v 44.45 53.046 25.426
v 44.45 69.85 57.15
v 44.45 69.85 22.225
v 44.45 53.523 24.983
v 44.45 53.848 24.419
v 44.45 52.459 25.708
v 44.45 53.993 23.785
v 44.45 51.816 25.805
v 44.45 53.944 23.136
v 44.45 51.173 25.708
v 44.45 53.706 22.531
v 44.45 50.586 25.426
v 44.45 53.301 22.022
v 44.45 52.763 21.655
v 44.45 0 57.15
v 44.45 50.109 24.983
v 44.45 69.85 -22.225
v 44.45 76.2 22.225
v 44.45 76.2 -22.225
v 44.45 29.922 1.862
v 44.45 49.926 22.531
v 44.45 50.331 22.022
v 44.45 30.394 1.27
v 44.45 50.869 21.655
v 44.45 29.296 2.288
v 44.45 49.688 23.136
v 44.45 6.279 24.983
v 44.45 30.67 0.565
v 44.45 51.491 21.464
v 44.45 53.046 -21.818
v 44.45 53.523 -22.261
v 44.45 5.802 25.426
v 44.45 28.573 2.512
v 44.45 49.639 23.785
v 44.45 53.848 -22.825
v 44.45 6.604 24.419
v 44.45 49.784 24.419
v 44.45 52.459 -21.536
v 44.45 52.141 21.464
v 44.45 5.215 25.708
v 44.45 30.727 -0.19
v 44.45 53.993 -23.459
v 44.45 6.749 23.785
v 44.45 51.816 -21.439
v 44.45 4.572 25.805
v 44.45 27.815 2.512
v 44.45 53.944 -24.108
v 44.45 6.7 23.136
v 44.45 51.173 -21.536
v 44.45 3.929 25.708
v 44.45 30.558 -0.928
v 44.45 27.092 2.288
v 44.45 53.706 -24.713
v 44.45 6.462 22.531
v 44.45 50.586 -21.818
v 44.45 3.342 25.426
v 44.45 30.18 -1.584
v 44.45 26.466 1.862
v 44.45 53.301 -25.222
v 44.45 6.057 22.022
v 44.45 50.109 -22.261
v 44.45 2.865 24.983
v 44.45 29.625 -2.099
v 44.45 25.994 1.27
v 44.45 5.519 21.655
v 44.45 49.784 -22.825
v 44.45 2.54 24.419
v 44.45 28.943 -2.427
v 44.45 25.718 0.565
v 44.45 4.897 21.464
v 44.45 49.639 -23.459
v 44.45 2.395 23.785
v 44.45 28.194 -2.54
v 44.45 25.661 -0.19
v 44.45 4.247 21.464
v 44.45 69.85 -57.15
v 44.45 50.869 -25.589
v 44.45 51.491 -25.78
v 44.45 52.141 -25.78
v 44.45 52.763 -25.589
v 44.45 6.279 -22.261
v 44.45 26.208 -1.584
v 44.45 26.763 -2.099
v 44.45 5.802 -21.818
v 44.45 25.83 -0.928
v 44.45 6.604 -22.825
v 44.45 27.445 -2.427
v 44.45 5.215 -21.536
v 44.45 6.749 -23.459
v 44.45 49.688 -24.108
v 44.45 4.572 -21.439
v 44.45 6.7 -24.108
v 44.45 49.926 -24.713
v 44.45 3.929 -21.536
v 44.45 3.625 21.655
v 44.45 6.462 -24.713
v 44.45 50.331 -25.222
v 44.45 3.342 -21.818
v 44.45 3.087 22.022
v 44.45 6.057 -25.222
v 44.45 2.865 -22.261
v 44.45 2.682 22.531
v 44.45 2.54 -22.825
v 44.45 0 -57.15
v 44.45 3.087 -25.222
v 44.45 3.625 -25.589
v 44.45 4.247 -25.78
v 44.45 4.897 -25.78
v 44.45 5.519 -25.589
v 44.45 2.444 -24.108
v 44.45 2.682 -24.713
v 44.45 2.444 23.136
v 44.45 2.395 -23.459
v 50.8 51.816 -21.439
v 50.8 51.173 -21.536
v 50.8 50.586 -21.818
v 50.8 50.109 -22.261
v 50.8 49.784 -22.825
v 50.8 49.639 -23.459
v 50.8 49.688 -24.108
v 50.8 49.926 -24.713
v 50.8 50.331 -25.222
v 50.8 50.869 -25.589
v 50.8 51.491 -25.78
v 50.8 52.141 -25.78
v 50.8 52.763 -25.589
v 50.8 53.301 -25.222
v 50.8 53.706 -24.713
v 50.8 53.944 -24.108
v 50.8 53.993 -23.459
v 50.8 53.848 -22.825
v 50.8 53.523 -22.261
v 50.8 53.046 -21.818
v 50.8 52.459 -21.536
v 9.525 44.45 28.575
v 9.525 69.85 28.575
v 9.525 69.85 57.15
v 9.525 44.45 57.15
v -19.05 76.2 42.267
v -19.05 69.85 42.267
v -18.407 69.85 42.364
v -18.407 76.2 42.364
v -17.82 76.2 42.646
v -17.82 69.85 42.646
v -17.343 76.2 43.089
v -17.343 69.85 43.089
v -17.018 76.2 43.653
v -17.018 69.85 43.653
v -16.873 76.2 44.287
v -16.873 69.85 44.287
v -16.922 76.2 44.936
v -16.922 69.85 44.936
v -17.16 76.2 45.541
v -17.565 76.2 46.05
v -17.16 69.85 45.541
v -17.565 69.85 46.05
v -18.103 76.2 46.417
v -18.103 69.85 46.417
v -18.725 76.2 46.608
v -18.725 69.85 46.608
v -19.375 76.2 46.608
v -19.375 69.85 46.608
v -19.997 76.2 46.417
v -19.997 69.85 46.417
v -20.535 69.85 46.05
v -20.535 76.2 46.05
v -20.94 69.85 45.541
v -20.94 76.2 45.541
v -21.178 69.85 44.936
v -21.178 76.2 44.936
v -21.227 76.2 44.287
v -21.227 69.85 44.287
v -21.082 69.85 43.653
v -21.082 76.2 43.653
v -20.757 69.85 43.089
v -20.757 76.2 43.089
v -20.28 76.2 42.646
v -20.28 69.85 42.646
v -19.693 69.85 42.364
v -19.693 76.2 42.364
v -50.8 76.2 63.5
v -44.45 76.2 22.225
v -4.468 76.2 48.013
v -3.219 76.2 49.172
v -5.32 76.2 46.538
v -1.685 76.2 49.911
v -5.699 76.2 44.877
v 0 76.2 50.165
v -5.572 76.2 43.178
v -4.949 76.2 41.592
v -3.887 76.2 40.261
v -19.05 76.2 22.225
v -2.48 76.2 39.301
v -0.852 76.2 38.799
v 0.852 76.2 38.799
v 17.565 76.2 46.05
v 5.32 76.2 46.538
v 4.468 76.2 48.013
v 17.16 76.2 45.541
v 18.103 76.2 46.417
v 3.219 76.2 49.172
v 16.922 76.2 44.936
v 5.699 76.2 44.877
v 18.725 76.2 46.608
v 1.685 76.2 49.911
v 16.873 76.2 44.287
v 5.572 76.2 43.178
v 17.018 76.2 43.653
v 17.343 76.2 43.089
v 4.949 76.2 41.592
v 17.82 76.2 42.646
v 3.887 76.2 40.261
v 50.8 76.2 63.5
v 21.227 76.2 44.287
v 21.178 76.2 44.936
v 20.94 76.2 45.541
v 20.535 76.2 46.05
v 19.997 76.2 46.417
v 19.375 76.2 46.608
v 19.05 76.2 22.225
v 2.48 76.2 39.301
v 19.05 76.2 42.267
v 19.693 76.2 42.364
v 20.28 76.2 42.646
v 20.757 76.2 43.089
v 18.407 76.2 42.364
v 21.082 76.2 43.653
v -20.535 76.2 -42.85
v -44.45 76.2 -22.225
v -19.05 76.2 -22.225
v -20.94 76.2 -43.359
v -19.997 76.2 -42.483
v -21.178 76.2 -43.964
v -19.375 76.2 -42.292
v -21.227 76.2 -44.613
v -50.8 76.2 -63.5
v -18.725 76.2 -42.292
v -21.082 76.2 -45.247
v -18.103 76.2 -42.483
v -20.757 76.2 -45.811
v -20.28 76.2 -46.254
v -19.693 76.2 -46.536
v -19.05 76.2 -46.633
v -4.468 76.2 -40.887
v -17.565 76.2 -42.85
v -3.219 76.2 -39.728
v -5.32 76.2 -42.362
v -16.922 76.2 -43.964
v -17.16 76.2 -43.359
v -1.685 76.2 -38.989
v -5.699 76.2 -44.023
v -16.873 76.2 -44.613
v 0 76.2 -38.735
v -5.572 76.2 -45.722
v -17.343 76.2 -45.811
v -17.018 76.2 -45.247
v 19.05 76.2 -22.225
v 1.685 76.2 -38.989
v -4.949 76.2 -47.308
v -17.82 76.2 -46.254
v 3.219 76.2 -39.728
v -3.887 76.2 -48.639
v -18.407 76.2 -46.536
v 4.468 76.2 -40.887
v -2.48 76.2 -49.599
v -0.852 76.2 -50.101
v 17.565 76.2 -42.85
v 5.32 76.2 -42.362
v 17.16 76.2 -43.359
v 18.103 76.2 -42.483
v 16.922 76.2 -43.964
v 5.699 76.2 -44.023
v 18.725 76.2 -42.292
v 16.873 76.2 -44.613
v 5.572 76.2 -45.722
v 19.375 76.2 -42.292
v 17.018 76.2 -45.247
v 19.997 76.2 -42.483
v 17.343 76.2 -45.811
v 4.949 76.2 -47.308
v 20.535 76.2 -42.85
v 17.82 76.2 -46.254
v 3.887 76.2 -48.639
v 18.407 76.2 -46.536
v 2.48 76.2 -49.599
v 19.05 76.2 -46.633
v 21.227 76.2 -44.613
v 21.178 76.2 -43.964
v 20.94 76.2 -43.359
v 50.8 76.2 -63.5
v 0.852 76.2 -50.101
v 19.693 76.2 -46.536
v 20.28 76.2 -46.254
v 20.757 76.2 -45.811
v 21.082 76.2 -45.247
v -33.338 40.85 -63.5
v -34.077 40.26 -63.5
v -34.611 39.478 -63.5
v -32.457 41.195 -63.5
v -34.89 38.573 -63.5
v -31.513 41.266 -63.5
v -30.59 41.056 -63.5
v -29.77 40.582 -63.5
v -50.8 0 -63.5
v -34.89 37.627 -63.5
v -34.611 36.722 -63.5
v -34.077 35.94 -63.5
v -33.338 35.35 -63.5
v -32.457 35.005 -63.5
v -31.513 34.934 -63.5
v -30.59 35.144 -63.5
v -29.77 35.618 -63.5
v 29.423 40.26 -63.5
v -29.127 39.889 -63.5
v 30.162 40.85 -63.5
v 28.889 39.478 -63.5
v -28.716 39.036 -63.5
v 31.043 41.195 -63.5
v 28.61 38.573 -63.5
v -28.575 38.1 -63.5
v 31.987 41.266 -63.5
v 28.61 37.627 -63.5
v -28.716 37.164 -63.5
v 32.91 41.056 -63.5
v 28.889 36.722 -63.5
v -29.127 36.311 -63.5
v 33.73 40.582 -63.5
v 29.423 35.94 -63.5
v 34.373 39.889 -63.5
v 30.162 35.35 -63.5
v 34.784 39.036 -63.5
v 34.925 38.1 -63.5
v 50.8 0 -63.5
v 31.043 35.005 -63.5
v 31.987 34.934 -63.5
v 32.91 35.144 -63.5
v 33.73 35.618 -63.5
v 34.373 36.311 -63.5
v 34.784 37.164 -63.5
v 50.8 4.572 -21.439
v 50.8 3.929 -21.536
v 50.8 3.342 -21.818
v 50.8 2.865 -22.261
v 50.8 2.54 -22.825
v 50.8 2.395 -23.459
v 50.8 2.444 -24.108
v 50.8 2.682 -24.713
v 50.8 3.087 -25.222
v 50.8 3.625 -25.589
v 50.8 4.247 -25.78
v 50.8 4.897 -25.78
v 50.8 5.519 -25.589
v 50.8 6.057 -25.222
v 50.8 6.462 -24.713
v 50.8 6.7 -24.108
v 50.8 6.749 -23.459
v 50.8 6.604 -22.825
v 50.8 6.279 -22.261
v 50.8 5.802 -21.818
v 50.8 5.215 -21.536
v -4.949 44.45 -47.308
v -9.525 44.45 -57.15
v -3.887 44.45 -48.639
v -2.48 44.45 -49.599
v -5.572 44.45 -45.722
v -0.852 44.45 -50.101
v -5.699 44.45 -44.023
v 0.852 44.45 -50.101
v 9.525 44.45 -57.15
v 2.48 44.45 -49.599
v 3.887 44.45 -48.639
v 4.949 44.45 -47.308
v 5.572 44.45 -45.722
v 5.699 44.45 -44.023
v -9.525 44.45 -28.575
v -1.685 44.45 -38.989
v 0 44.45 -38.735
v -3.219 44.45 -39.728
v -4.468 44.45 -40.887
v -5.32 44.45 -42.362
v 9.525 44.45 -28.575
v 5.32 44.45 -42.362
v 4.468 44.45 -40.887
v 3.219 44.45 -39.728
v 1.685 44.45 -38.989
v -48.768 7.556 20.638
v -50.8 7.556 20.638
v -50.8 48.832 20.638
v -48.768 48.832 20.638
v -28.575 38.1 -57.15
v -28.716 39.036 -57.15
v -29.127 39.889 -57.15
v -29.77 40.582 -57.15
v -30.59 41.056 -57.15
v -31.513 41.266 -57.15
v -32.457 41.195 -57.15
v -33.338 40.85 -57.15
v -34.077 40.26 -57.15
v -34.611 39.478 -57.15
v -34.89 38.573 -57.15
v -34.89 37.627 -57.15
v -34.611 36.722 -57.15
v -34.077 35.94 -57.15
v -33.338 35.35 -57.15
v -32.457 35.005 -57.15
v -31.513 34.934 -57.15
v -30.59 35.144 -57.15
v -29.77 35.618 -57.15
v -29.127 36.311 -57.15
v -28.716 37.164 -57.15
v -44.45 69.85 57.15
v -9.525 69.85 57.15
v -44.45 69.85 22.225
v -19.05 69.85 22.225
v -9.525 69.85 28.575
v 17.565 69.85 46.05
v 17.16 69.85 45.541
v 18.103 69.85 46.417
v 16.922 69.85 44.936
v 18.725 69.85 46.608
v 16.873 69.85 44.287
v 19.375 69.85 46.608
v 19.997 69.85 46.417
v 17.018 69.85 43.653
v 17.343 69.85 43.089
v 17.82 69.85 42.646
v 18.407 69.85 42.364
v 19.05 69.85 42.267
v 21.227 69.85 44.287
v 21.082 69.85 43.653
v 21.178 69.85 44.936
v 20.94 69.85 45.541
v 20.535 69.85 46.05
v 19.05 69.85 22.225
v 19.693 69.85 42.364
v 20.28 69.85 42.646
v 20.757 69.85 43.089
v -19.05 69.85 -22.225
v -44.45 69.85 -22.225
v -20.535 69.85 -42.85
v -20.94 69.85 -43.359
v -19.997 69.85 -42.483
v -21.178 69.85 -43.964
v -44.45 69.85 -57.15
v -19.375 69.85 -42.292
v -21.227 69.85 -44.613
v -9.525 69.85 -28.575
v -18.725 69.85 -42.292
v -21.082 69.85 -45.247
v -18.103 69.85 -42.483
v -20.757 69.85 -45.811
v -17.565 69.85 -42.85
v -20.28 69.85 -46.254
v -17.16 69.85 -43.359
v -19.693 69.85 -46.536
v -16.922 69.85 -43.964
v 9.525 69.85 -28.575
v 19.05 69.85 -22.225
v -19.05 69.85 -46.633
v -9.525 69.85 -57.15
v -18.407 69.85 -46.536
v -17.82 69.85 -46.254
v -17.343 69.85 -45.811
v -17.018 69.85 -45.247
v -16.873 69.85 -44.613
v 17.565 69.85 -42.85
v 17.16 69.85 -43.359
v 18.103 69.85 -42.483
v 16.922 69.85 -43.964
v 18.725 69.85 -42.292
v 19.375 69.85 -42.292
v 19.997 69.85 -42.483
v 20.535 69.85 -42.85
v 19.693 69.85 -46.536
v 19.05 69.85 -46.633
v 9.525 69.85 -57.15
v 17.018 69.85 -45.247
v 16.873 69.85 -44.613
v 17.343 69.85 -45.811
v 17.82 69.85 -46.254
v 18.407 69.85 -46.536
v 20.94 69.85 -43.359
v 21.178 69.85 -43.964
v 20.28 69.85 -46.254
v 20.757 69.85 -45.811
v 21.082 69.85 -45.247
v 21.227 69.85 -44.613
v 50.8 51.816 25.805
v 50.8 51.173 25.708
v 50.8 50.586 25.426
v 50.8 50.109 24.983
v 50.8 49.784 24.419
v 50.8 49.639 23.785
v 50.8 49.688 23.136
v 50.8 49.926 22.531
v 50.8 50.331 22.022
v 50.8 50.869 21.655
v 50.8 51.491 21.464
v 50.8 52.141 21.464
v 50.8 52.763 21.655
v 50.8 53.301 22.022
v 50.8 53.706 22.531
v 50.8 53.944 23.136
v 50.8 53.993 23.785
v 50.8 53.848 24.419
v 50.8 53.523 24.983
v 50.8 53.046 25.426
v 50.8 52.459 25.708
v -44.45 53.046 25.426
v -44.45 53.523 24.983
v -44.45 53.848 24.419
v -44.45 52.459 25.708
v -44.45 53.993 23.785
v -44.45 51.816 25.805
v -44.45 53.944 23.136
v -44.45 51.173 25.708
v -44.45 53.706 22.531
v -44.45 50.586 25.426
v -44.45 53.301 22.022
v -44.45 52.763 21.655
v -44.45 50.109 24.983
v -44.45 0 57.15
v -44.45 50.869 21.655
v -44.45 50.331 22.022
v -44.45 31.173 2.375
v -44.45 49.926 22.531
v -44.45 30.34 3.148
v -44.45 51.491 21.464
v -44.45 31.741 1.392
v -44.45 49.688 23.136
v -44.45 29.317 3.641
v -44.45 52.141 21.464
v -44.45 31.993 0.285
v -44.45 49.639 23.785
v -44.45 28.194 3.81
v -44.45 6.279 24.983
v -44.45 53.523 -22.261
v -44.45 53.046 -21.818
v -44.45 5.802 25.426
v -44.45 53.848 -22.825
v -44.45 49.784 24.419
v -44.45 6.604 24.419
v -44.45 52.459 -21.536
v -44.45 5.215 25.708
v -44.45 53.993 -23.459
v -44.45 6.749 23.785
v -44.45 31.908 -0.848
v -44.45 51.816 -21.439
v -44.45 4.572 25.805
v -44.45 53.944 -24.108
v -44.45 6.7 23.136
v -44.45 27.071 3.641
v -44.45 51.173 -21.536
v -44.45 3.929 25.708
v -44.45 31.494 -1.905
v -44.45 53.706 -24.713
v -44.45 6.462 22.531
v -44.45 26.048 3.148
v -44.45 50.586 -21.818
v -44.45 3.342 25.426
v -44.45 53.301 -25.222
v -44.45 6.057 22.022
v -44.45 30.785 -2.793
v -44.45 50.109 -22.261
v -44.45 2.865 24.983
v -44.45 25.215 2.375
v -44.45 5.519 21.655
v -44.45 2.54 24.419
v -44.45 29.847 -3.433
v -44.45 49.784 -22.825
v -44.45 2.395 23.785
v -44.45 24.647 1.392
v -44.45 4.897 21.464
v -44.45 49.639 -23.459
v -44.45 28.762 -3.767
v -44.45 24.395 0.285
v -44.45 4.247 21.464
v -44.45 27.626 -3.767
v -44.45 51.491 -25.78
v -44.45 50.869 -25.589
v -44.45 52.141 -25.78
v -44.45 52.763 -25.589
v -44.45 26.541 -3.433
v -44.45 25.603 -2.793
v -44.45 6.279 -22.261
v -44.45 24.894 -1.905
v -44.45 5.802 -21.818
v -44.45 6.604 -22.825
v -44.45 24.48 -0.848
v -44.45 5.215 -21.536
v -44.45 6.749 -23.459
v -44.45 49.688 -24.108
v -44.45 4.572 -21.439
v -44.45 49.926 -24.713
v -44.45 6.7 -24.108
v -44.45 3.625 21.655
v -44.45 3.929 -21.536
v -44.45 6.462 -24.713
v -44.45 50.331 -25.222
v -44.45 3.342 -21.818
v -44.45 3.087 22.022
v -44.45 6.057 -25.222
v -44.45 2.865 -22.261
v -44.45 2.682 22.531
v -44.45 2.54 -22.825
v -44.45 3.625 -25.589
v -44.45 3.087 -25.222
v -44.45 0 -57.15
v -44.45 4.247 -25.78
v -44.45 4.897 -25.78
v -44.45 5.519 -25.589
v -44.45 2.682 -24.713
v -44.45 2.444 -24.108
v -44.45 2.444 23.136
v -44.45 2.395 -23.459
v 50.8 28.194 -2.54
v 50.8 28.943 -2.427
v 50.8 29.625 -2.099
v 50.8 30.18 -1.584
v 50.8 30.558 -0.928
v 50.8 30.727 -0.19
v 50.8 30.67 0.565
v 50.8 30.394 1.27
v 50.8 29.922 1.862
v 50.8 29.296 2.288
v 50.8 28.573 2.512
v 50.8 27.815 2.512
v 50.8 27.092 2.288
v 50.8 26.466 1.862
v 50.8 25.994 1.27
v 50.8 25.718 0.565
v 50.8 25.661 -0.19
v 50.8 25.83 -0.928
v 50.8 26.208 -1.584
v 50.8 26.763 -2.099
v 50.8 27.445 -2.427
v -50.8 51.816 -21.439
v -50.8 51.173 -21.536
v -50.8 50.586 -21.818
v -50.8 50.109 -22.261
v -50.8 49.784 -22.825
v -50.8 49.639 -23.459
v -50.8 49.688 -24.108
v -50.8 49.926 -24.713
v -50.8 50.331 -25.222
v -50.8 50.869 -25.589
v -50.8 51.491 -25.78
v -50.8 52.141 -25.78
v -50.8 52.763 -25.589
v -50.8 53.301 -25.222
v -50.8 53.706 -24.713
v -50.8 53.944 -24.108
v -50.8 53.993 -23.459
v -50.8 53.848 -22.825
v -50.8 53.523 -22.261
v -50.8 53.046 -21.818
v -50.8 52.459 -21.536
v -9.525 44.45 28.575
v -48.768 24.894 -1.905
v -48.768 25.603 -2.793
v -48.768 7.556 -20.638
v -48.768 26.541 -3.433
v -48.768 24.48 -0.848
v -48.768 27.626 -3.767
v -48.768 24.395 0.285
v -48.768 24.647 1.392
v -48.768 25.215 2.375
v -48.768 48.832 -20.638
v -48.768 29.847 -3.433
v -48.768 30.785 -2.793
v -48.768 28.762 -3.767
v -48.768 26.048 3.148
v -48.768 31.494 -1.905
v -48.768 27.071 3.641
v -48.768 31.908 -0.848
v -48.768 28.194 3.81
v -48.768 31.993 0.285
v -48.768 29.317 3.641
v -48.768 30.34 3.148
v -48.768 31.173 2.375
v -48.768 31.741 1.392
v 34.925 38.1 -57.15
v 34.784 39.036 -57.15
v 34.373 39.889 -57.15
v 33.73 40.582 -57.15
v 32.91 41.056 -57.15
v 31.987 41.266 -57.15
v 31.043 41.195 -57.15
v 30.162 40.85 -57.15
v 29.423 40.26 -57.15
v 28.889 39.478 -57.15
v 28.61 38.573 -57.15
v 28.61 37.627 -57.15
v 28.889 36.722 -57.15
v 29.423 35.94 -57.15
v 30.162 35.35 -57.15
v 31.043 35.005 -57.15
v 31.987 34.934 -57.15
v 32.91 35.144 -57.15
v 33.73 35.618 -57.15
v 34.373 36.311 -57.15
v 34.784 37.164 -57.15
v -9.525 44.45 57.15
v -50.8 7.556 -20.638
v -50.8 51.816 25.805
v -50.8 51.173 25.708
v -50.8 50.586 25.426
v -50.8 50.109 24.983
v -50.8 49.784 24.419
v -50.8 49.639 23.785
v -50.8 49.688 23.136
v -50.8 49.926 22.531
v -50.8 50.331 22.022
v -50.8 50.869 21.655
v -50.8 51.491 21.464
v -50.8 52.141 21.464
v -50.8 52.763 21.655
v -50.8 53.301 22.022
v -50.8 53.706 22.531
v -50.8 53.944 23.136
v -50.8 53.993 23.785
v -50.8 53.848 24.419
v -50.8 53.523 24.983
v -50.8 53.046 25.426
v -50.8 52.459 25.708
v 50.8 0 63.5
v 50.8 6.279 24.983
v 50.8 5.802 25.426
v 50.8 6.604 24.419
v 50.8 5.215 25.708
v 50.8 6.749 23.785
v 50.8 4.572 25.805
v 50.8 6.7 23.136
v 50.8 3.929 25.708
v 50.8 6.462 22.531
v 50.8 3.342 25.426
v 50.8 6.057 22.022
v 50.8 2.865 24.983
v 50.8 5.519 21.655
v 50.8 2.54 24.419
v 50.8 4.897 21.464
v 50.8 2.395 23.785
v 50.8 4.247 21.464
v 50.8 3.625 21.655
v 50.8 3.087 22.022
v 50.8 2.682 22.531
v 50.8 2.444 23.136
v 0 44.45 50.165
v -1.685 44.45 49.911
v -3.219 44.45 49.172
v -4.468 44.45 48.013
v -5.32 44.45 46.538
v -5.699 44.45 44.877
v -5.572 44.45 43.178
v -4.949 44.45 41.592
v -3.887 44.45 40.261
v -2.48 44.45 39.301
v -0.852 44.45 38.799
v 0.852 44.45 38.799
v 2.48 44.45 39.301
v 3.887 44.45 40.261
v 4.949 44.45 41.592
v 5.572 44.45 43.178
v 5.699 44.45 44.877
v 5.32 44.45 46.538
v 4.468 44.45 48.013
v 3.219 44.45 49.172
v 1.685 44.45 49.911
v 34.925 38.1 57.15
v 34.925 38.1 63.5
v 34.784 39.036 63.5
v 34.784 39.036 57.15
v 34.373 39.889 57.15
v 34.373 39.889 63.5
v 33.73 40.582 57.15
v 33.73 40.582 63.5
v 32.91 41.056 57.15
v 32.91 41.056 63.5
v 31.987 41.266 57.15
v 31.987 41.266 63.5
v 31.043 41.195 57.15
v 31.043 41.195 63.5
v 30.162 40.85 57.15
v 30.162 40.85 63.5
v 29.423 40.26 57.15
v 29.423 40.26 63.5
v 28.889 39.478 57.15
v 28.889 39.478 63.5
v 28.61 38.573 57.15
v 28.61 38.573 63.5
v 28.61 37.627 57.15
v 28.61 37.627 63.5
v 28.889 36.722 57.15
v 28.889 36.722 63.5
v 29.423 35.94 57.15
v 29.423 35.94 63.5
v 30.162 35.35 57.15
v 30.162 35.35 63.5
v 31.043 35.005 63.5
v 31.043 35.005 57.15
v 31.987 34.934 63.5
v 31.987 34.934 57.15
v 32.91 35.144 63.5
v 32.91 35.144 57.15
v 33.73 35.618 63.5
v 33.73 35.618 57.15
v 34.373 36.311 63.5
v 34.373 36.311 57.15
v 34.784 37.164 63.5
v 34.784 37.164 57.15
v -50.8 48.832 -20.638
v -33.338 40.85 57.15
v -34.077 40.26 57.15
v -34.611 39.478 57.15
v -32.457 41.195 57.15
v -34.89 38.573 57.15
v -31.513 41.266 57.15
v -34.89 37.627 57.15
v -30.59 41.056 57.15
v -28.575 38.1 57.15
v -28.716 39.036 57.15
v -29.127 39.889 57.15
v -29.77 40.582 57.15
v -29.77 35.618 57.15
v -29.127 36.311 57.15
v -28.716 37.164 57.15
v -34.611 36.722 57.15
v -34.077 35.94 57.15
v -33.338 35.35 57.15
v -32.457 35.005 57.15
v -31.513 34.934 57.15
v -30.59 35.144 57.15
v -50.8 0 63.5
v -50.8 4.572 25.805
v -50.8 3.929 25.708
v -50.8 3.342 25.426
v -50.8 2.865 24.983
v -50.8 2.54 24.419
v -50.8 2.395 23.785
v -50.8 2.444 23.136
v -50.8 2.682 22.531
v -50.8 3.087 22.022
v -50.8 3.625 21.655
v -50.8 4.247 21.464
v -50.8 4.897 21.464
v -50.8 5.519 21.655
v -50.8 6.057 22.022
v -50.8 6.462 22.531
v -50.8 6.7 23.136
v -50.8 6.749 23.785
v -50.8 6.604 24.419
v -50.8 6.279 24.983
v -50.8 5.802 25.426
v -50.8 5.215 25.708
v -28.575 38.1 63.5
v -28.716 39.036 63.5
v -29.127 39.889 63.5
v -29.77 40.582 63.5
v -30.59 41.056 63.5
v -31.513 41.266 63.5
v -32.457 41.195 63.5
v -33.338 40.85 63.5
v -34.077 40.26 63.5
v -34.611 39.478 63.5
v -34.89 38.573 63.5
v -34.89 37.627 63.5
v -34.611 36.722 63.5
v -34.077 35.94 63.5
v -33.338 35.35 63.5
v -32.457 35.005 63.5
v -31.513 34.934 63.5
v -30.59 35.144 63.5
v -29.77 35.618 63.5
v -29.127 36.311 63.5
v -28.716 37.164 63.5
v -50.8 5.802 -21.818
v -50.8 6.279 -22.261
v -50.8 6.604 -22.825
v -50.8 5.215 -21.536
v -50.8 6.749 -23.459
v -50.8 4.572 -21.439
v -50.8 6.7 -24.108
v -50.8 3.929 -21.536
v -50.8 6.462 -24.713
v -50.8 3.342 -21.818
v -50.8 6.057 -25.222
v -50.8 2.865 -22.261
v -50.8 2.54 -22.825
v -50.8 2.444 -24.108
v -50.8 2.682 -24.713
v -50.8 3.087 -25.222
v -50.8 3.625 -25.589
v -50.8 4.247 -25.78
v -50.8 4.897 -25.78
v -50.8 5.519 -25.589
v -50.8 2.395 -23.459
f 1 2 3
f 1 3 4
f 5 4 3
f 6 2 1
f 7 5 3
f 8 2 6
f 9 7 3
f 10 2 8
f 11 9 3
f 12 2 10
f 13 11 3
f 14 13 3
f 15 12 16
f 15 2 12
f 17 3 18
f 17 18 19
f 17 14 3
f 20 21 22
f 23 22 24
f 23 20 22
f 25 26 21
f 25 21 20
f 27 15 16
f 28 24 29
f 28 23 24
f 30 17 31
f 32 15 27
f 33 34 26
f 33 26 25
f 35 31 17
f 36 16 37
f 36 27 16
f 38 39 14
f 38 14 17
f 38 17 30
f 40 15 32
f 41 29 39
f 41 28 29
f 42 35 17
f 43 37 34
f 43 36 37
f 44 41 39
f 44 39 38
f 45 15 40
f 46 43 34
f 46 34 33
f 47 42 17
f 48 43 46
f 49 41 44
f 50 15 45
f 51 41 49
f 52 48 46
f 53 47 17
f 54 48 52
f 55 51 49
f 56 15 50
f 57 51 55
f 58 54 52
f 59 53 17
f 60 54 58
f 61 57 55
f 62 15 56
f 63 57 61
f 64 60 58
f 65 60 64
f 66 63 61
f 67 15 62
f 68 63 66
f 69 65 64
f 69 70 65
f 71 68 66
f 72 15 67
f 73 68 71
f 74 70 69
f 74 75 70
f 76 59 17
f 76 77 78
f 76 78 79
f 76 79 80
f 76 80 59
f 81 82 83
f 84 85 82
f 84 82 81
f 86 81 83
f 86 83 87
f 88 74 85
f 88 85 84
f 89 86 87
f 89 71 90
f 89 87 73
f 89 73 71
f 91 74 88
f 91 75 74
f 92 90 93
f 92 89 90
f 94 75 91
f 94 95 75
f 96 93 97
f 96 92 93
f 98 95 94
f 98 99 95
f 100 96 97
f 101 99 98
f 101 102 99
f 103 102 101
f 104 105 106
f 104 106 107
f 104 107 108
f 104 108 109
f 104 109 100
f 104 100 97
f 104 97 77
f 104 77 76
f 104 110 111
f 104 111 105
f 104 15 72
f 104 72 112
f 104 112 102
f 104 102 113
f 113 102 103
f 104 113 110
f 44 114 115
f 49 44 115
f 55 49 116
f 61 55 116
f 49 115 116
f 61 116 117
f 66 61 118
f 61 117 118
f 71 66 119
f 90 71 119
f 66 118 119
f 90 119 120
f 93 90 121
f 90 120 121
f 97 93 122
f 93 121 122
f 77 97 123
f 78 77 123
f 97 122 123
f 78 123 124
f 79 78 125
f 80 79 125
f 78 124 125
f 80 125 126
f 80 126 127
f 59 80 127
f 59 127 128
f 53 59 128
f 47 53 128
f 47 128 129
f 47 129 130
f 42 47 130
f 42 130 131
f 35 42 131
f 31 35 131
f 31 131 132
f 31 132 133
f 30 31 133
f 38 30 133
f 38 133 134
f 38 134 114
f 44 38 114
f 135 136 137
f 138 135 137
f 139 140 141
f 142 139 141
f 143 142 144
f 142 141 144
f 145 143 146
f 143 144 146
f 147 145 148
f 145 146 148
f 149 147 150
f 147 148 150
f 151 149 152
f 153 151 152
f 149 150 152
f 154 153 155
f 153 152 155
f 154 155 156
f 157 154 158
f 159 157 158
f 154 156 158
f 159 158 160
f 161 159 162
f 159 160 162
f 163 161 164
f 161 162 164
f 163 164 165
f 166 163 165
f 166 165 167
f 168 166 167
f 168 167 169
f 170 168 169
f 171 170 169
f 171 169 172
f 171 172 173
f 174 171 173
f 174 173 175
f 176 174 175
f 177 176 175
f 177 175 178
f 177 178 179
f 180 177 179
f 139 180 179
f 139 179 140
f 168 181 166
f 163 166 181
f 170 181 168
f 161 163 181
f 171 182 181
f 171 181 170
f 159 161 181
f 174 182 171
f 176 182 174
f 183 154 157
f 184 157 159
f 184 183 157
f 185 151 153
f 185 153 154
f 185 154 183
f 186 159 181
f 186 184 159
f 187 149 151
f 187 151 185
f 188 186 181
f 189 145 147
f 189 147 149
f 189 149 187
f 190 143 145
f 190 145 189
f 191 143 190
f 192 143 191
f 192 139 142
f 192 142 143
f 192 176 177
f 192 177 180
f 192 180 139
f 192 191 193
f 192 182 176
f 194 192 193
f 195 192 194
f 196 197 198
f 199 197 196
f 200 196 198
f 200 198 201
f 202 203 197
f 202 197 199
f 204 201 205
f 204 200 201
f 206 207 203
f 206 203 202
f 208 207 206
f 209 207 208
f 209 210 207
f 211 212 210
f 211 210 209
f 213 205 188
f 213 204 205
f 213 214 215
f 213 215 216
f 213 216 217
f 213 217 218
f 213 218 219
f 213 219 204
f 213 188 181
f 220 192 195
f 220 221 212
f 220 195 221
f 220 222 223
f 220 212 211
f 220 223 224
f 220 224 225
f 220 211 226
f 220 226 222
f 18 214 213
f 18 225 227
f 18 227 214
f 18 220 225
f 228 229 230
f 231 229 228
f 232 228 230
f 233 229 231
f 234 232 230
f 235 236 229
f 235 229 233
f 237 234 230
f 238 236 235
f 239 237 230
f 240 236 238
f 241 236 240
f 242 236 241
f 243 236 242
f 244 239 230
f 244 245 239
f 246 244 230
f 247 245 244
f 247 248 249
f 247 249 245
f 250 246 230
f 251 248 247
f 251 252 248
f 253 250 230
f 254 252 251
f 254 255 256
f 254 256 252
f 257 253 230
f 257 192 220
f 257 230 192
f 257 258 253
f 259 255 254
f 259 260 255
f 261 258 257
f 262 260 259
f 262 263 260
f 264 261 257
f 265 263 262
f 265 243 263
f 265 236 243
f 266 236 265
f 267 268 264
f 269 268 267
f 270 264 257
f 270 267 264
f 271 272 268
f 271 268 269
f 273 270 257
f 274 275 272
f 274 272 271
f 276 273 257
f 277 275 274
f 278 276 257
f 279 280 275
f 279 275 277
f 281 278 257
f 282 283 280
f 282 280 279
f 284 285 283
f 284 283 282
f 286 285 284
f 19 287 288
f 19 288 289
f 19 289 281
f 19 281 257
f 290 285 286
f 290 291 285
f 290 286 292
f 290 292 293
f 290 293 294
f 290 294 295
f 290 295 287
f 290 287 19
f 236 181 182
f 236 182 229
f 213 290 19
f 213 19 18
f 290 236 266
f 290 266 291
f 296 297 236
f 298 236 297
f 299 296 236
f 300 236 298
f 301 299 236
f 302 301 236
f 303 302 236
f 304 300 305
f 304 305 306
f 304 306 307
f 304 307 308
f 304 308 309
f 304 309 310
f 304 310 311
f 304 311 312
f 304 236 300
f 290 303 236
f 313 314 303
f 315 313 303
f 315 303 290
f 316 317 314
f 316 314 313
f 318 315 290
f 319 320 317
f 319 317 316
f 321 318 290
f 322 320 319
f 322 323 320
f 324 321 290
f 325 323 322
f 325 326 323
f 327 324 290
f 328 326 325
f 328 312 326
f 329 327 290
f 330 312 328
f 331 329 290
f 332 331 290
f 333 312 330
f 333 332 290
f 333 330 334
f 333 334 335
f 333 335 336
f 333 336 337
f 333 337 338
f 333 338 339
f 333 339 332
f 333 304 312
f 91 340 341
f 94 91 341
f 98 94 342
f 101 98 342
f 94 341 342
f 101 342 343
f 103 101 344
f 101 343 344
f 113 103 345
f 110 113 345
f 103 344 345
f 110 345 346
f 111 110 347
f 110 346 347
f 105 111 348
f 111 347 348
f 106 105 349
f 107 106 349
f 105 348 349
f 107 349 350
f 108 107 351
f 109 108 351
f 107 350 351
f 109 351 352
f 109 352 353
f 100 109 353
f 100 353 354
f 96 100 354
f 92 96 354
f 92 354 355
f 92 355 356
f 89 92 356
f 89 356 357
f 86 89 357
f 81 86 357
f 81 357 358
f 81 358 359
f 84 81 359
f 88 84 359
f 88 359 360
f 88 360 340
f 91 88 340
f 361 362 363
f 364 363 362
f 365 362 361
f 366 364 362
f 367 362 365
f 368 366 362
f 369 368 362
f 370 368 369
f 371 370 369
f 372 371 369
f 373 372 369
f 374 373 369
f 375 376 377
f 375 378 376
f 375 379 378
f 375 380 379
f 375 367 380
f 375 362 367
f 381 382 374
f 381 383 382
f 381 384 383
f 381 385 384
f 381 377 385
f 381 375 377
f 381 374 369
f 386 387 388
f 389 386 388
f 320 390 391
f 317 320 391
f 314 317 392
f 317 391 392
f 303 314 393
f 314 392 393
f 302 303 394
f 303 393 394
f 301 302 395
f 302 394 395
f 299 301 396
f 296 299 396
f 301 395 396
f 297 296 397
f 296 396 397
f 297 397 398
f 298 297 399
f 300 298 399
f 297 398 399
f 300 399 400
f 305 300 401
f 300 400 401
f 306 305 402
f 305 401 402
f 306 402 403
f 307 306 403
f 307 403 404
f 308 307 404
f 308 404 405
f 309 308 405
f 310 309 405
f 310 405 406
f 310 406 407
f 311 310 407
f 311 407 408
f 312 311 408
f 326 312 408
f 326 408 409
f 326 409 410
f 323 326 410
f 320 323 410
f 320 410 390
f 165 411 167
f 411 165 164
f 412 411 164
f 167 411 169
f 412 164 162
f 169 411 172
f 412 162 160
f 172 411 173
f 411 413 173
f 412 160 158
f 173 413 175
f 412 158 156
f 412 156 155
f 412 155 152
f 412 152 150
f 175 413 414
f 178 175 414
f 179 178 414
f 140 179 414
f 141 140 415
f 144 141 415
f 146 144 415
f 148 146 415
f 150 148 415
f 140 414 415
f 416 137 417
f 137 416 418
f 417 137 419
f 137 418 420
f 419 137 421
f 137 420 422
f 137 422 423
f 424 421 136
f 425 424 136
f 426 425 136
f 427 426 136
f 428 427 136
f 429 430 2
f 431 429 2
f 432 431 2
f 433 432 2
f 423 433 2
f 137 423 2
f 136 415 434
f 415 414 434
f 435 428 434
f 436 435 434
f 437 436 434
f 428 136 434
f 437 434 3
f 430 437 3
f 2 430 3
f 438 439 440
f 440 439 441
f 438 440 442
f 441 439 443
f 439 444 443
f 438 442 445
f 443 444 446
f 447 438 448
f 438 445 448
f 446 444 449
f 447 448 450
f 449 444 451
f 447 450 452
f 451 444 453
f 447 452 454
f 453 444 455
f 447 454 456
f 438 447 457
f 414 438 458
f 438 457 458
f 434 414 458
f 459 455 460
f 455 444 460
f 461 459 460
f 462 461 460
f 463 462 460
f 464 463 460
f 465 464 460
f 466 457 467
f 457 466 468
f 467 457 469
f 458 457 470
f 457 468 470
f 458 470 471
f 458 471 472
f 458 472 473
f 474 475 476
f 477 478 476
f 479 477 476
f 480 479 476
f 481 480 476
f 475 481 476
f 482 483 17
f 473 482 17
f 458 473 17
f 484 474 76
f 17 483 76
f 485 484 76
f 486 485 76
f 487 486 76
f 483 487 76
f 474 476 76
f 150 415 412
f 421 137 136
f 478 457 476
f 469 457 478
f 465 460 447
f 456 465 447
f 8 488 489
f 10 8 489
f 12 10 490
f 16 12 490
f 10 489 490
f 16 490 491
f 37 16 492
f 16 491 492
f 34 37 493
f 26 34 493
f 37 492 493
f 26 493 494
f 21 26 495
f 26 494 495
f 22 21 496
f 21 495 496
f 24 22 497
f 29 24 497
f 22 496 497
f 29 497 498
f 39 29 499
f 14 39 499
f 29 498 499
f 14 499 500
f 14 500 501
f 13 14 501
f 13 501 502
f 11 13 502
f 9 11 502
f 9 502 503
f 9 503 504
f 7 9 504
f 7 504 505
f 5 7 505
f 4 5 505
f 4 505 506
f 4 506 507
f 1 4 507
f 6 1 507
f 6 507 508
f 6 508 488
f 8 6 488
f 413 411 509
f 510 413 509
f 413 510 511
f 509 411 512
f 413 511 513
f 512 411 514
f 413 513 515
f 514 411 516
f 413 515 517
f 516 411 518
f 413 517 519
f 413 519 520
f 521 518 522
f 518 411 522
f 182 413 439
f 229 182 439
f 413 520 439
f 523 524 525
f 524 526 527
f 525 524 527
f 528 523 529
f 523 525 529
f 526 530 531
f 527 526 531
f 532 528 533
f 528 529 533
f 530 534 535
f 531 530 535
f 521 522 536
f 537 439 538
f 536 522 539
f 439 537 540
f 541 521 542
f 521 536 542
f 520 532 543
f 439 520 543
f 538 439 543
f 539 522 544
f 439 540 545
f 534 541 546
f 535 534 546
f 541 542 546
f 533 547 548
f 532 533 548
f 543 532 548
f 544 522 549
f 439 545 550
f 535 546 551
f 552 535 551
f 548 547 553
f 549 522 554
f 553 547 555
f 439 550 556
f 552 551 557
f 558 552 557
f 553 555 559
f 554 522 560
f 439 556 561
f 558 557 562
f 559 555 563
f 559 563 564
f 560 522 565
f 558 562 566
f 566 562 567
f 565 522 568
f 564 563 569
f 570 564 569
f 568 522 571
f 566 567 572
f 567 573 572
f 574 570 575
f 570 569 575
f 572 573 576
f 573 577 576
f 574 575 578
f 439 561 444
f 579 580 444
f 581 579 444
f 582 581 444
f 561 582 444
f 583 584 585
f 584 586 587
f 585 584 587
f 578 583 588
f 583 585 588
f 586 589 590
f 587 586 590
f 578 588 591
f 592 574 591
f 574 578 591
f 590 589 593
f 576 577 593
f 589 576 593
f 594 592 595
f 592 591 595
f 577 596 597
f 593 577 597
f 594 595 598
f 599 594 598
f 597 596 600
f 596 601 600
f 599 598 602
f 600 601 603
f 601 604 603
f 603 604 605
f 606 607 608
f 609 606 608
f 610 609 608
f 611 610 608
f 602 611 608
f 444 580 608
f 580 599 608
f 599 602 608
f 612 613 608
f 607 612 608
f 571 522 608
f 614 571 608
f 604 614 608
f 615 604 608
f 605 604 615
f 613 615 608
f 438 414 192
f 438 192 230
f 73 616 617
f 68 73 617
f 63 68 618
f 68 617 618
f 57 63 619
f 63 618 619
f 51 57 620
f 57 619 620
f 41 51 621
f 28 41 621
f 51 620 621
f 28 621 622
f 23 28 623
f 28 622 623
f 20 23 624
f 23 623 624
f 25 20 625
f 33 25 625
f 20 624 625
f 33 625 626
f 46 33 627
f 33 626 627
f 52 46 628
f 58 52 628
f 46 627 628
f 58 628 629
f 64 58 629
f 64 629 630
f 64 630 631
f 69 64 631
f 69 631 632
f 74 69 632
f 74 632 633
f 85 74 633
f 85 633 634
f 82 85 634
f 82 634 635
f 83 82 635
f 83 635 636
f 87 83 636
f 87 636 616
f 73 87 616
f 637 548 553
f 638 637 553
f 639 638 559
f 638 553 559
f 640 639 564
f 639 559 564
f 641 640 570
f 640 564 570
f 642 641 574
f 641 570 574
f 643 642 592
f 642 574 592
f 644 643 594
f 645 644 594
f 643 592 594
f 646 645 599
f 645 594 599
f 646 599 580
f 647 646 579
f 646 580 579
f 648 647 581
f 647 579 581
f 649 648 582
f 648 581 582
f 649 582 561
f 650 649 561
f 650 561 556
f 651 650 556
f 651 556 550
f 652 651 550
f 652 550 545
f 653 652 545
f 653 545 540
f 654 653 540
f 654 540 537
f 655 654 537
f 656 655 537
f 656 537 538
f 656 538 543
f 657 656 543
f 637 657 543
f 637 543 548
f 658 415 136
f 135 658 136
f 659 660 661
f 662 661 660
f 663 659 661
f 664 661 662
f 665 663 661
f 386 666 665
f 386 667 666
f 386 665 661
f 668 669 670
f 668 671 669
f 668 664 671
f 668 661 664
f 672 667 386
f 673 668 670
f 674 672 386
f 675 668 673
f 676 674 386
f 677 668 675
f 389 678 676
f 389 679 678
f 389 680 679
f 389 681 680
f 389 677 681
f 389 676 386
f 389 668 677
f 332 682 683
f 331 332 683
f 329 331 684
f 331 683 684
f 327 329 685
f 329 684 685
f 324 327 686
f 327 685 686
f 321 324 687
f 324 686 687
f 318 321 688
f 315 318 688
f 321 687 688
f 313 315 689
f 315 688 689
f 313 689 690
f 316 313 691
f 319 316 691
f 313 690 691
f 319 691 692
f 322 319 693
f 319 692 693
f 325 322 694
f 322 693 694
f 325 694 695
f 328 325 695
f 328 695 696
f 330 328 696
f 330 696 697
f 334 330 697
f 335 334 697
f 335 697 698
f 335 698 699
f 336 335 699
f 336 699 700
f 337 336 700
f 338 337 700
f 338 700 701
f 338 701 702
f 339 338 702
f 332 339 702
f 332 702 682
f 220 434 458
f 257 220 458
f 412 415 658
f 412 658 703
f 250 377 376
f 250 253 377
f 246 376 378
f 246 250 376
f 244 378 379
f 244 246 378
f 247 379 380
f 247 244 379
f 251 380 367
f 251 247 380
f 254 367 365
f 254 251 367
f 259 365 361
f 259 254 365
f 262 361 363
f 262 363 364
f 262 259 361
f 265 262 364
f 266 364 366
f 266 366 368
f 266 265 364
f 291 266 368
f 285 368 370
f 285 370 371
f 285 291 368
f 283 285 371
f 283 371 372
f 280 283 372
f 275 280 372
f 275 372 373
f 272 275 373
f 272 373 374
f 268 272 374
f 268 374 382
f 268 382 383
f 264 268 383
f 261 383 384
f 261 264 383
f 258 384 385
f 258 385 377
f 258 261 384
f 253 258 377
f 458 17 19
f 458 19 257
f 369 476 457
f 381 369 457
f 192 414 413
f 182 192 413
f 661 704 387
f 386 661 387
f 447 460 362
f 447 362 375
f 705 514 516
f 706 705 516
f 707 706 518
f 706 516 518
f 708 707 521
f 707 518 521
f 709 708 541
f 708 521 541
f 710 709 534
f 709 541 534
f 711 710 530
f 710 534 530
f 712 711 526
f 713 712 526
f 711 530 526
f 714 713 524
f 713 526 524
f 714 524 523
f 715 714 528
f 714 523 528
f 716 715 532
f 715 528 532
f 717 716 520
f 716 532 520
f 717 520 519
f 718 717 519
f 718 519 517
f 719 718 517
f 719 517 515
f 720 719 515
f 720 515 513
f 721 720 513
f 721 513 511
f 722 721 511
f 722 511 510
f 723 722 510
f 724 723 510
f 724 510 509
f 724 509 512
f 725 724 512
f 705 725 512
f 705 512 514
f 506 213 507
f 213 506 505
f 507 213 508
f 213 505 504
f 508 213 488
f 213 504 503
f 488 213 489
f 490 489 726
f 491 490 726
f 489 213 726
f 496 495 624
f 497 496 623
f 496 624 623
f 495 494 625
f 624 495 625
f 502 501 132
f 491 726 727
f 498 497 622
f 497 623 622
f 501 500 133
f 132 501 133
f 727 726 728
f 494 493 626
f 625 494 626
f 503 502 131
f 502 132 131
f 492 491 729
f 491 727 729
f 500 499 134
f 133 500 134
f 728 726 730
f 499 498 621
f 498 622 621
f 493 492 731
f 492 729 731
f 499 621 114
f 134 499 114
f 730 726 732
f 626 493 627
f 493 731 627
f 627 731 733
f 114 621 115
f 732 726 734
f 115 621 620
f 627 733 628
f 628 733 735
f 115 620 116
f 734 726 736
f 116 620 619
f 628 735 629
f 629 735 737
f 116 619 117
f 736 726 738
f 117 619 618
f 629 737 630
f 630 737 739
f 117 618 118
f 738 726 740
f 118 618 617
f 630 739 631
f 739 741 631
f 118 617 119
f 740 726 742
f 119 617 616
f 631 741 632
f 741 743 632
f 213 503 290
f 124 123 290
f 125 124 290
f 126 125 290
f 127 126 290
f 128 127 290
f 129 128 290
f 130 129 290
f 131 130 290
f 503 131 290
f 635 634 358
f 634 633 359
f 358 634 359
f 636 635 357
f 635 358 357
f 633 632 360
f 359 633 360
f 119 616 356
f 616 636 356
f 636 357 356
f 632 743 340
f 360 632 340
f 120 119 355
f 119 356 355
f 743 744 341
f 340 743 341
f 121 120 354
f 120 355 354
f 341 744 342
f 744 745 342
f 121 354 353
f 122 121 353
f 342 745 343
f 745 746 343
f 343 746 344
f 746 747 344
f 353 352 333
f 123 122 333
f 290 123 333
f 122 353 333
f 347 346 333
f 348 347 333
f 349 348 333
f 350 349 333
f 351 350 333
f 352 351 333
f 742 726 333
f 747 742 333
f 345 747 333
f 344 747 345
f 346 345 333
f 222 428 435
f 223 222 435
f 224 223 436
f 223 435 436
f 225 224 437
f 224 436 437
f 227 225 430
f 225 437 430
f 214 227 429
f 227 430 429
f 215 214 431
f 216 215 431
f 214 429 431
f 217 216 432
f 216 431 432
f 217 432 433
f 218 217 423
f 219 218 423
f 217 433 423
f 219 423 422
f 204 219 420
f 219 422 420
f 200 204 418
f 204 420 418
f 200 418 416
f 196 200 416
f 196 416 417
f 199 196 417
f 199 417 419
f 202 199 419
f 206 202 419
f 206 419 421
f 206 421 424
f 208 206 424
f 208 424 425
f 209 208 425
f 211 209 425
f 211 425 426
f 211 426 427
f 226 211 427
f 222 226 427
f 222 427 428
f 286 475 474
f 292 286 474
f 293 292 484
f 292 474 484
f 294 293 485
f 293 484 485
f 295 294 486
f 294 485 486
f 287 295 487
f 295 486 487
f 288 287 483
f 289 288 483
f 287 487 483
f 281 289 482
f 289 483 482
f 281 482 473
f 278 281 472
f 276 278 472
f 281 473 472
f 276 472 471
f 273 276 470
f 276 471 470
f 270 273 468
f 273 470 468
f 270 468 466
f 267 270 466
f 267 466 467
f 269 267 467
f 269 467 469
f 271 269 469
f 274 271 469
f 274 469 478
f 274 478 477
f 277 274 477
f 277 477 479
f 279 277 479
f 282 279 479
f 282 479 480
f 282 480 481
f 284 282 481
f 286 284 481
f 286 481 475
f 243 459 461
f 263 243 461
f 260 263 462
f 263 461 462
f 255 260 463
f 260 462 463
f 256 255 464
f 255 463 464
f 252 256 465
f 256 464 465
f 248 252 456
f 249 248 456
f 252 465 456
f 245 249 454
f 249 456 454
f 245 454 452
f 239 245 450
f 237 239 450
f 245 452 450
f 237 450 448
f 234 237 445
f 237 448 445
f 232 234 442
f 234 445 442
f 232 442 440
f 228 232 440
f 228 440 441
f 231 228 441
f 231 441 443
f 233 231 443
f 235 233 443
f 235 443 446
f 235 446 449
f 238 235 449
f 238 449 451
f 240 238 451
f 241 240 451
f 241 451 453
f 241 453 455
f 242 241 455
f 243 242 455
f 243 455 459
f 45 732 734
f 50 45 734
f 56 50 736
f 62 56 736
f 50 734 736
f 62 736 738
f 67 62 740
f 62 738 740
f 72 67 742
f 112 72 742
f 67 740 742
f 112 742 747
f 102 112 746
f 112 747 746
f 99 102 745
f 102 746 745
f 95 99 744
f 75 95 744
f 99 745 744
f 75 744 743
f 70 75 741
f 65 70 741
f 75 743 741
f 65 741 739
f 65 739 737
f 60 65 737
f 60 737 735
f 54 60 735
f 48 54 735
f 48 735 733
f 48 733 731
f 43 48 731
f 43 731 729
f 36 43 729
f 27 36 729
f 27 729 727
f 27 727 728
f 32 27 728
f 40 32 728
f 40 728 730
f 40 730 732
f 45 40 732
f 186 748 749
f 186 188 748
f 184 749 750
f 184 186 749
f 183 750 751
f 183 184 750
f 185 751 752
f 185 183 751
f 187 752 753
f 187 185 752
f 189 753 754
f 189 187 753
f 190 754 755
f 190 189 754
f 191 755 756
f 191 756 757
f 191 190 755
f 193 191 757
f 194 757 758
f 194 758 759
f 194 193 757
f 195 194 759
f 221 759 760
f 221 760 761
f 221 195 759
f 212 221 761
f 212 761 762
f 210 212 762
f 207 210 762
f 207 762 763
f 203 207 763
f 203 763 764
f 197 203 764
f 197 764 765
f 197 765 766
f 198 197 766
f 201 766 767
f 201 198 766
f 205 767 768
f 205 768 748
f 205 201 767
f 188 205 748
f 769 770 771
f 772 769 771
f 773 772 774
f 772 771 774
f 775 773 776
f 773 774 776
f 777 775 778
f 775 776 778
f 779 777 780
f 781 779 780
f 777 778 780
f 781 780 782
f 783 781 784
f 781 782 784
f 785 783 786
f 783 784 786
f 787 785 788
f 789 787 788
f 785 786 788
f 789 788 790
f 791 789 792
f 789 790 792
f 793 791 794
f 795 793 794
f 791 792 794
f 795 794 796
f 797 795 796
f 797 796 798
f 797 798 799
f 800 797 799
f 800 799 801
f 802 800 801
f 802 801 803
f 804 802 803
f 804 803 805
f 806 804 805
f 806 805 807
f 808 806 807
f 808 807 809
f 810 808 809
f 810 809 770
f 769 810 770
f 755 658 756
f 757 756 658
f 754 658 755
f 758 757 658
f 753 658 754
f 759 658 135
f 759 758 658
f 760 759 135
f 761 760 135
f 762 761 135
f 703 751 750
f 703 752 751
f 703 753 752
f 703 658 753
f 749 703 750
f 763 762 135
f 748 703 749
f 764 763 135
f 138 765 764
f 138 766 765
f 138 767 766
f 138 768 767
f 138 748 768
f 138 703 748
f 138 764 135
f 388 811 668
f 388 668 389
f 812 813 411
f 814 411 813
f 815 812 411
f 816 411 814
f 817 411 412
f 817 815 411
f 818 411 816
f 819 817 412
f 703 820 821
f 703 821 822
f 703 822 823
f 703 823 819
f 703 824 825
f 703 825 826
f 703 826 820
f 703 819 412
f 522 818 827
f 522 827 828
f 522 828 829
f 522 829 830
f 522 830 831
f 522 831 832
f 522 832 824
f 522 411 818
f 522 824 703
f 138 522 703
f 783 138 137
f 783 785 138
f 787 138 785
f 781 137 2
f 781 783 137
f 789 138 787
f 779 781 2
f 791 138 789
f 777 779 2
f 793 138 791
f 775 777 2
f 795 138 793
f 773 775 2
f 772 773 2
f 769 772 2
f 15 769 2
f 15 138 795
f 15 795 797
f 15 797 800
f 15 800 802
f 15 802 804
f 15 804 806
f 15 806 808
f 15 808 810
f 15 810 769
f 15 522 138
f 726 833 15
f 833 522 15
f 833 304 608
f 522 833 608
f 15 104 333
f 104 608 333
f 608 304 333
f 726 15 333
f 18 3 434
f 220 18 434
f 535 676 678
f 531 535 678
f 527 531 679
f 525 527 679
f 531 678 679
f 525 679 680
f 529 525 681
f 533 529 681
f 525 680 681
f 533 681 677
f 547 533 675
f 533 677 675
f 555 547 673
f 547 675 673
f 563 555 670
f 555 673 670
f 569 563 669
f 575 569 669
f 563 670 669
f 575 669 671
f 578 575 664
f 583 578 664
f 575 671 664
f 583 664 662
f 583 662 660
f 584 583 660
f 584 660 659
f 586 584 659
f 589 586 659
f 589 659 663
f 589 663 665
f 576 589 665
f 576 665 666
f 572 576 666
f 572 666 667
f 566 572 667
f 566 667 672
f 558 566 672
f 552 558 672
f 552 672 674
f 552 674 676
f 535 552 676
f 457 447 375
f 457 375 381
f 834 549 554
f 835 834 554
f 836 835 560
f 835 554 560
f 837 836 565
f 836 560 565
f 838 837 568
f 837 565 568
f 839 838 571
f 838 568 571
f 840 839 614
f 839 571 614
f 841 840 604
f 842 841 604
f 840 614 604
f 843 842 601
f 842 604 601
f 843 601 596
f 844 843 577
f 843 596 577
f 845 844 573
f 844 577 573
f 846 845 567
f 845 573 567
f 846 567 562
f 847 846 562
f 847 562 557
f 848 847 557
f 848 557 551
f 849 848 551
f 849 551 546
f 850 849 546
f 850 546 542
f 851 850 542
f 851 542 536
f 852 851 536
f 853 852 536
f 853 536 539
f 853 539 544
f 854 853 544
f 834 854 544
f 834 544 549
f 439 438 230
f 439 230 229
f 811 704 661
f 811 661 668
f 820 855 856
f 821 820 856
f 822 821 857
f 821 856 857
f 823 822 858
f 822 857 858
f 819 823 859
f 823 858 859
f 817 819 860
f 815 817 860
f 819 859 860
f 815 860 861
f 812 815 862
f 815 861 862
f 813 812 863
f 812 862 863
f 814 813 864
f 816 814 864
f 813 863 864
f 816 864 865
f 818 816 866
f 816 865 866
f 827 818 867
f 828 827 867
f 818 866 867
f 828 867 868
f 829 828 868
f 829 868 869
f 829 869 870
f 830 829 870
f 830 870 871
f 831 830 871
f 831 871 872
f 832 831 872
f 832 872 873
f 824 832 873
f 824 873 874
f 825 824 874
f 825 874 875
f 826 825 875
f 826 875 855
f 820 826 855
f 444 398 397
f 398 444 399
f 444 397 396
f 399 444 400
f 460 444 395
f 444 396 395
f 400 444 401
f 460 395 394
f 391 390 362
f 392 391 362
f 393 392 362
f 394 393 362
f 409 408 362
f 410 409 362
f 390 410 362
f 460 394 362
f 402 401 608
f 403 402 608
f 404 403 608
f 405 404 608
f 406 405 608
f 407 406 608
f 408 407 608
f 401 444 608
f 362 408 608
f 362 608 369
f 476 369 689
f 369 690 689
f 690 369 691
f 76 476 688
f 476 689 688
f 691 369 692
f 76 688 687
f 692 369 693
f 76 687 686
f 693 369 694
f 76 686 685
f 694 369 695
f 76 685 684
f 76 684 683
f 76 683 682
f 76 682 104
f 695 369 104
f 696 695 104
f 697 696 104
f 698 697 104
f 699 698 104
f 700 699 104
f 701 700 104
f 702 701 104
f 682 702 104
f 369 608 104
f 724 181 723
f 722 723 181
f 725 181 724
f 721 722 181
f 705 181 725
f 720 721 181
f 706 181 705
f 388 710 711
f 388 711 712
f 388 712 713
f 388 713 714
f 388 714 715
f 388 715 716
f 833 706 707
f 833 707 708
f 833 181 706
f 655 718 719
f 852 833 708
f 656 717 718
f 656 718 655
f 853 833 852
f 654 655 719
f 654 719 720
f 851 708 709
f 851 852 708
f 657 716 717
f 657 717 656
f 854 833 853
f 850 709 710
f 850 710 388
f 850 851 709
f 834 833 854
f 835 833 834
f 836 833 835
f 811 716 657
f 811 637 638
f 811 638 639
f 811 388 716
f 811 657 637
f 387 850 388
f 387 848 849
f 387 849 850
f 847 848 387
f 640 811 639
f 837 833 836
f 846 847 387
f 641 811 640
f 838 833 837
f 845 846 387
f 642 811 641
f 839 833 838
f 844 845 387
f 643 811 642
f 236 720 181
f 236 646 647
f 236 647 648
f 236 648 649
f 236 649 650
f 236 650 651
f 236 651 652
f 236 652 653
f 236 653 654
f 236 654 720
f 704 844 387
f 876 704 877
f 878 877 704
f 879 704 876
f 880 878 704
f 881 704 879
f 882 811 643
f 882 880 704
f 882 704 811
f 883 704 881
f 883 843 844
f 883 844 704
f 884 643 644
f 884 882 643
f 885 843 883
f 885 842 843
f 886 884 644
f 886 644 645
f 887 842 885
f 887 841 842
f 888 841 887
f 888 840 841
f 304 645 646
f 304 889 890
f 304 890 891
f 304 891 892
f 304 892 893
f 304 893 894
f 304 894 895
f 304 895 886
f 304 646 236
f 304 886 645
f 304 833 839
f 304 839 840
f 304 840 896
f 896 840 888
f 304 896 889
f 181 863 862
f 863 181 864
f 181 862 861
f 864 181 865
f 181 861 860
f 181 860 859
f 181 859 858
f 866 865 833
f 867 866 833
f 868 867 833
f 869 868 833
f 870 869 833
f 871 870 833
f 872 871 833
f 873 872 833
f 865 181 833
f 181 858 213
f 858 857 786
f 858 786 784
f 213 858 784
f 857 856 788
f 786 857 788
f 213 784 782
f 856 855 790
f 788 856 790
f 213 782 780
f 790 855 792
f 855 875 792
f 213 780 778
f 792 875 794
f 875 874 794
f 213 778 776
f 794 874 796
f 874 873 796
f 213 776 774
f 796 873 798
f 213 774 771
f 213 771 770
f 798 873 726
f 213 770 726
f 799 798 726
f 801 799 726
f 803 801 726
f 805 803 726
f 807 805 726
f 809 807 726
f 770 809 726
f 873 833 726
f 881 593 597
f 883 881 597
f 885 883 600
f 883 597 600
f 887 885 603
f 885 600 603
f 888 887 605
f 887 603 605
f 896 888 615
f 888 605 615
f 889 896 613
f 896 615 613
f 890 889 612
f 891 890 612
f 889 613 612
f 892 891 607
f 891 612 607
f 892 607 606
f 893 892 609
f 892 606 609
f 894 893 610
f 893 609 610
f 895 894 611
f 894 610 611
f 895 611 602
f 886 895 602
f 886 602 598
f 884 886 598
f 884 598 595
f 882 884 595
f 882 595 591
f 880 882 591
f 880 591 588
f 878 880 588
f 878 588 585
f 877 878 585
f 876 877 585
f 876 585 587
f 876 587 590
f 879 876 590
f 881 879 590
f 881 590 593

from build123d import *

# Parameters (mm, degrees)
SKETCH2_W                            = 101.6
SKETCH2_H                            = 127
BOSS_EXTRUDE1_DEPTH                  = 76.2
SHELL1_T                             = -6.35
F_11_64_0_17188_DIAMETER_HOLE1_D     = 4.365752
F_11_64_0_17188_DIAMETER_HOLE1_DEPTH = 25.4
F_11_64_0_17188_DIAMETER_HOLE1_TIP   = 1.311604225
SKETCH4_R                            = 5.715
CUT_EXTRUDE2_DEPTH                   = 112.44204772
SKETCH6_W                            = 19.05
SKETCH6_H                            = 28.575
SKETCH6_R                            = 5.715
BOSS_EXTRUDE2_DEPTH                  = 25.4
F_11_64_0_17188_DIAMETER_HOLE2_D     = 4.365752
F_11_64_0_17188_DIAMETER_HOLE2_DEPTH = 127
F_11_64_0_17188_DIAMETER_HOLE2_TIP   = 1.311604225
CUT_EXTRUDE3_REACH                   = 143.99
SKETCH9_R                            = 3.81
SKETCH10_W                           = 25.4
SKETCH10_H                           = 44.45
CUT_EXTRUDE5_DEPTH                   = 108.200338152
SKETCH11_R                           = 3.175
CUT_EXTRUDE6_DEPTH                   = 157.576115675
CUT_EXTRUDE7_REACH                   = 143.99
SKETCH13_R                           = 2.54
SKETCH14_W                           = 41.275
SKETCH14_H                           = 41.275
CUT_EXTRUDE8_DEPTH                   = 2.032


with BuildPart() as part:
    # Sketch2 → Boss-Extrude1 (new body)
    with BuildSketch(Plane(origin=(0, 0, 0), x_dir=(1, 0, 0), z_dir=(0, 1, 0))):
        Rectangle(SKETCH2_W, SKETCH2_H)
    extrude(amount=BOSS_EXTRUDE1_DEPTH)

    # Shell1
    shell1_openings = [part.faces().sort_by_distance(p)[0] for p in [
        (0, 0, 0),
    ]]
    offset(amount=SHELL1_T, openings=shell1_openings, kind=Kind.INTERSECTION)

    # 11/64 (0.17188) Diameter Hole1
    with Locations(Plane(origin=(-19.05, 76.2, -44.45), x_dir=(0, 0, 1), z_dir=(0, 1, 0))):
        with Locations((0, 0), (0, 38.1), (88.9, 0), (88.9, 38.1)):
            Hole(F_11_64_0_17188_DIAMETER_HOLE1_D / 2, depth=F_11_64_0_17188_DIAMETER_HOLE1_DEPTH)
            with Locations((0, 0, -(F_11_64_0_17188_DIAMETER_HOLE1_DEPTH + F_11_64_0_17188_DIAMETER_HOLE1_TIP / 2))):  # 118° drill point
                Cone(0, F_11_64_0_17188_DIAMETER_HOLE1_D / 2, F_11_64_0_17188_DIAMETER_HOLE1_TIP, mode=Mode.SUBTRACT)

    # Sketch4 → Cut-Extrude2 (cut, through all)
    with BuildSketch(Plane(origin=(0, 76.2, 0), x_dir=(1, 0, 0), z_dir=(0, 1, 0))):
        with Locations(Location((0, 44.45, 0), (0, 0, 270))):
            Circle(SKETCH4_R)
        with Locations(Location((0, -44.45, 0), (0, 0, 270))):
            Circle(SKETCH4_R)
    extrude(amount=-CUT_EXTRUDE2_DEPTH, mode=Mode.SUBTRACT)

    # Sketch6 → Boss-Extrude2 (add)
    # profile 1 of 2: a face of its own
    with BuildSketch(Plane.XZ.offset(-69.85)):
        with Locations((0, 42.8625)):
            Rectangle(SKETCH6_W, SKETCH6_H)
        with Locations(Location((0, 44.45, 0), (0, 0, 90))):
            Circle(SKETCH6_R, mode=Mode.SUBTRACT)
    # profile 2 of 2: a face of its own
    with BuildSketch(Plane.XZ.offset(-69.85)):
        with Locations((0, -42.8625)):
            Rectangle(SKETCH6_W, SKETCH6_H)
        with Locations(Location((0, -44.45, 0), (0, 0, 90))):
            Circle(SKETCH6_R, mode=Mode.SUBTRACT)
    extrude(amount=BOSS_EXTRUDE2_DEPTH)

    # 11/64 (0.17188) Diameter Hole2
    with Locations(Plane(origin=(-50.8, 51.816, -23.622), x_dir=(0, 0, -1), z_dir=(-1, 0, 0))):
        with Locations((0, 0), (0, 47.244), (-47.244, 0), (-47.244, 47.244)):
            Hole(F_11_64_0_17188_DIAMETER_HOLE2_D / 2, depth=F_11_64_0_17188_DIAMETER_HOLE2_DEPTH)
            with Locations((0, 0, -(F_11_64_0_17188_DIAMETER_HOLE2_DEPTH + F_11_64_0_17188_DIAMETER_HOLE2_TIP / 2))):  # 118° drill point
                Cone(0, F_11_64_0_17188_DIAMETER_HOLE2_D / 2, F_11_64_0_17188_DIAMETER_HOLE2_TIP, mode=Mode.SUBTRACT)

    # Sketch9 → Cut-Extrude3 (cut, up to next)
    with BuildSketch(Plane.ZY.offset(50.8), mode=Mode.PRIVATE) as cut_extrude3_sk1:
        with Locations((0, 28.194)):
            Circle(SKETCH9_R)
    cut_extrude3_tool1 = extrude(cut_extrude3_sk1.sketch, amount=-CUT_EXTRUDE3_REACH, mode=Mode.PRIVATE) & part.part
    add(cut_extrude3_tool1.solids().sort_by_distance((-50.8, 28.194, 0))[0], mode=Mode.SUBTRACT)

    # Sketch10 → Cut-Extrude5 (cut, through all)
    with BuildSketch(Plane(origin=(0, 69.85, 0), x_dir=(-1, 0, 0), z_dir=(0, -1, 0))):
        with Locations((31.75, 0)):
            Rectangle(SKETCH10_W, SKETCH10_H)
        with Locations((-31.75, 0)):
            Rectangle(SKETCH10_W, SKETCH10_H)
    extrude(amount=-CUT_EXTRUDE5_DEPTH, mode=Mode.SUBTRACT)

    # Sketch11 → Cut-Extrude6 (cut, through all)
    with BuildSketch(Plane.XY.offset(63.5)):
        with Locations((-31.75, 38.1)):
            Circle(SKETCH11_R)
        with Locations((31.75, 38.1)):
            Circle(SKETCH11_R)
    extrude(amount=-CUT_EXTRUDE6_DEPTH, mode=Mode.SUBTRACT)

    # Sketch13 → Cut-Extrude7 (cut, up to next)
    with BuildSketch(Plane(origin=(50.8, 0, 0), x_dir=(0, 0, -1), z_dir=(1, 0, 0)), mode=Mode.PRIVATE) as cut_extrude7_sk1:
        with Locations((0, 28.194)):
            Circle(SKETCH13_R)
    cut_extrude7_tool1 = extrude(cut_extrude7_sk1.sketch, amount=-CUT_EXTRUDE7_REACH, mode=Mode.PRIVATE) & part.part
    add(cut_extrude7_tool1.solids().sort_by_distance((50.8, 28.194, 0))[0], mode=Mode.SUBTRACT)

    # Sketch14 → Cut-Extrude8 (cut)
    with BuildSketch(Plane.ZY.offset(50.8)):
        with Locations((0, 28.194)):
            Rectangle(SKETCH14_W, SKETCH14_H)
    extrude(amount=-CUT_EXTRUDE8_DEPTH, mode=Mode.SUBTRACT)


solid = part.part
